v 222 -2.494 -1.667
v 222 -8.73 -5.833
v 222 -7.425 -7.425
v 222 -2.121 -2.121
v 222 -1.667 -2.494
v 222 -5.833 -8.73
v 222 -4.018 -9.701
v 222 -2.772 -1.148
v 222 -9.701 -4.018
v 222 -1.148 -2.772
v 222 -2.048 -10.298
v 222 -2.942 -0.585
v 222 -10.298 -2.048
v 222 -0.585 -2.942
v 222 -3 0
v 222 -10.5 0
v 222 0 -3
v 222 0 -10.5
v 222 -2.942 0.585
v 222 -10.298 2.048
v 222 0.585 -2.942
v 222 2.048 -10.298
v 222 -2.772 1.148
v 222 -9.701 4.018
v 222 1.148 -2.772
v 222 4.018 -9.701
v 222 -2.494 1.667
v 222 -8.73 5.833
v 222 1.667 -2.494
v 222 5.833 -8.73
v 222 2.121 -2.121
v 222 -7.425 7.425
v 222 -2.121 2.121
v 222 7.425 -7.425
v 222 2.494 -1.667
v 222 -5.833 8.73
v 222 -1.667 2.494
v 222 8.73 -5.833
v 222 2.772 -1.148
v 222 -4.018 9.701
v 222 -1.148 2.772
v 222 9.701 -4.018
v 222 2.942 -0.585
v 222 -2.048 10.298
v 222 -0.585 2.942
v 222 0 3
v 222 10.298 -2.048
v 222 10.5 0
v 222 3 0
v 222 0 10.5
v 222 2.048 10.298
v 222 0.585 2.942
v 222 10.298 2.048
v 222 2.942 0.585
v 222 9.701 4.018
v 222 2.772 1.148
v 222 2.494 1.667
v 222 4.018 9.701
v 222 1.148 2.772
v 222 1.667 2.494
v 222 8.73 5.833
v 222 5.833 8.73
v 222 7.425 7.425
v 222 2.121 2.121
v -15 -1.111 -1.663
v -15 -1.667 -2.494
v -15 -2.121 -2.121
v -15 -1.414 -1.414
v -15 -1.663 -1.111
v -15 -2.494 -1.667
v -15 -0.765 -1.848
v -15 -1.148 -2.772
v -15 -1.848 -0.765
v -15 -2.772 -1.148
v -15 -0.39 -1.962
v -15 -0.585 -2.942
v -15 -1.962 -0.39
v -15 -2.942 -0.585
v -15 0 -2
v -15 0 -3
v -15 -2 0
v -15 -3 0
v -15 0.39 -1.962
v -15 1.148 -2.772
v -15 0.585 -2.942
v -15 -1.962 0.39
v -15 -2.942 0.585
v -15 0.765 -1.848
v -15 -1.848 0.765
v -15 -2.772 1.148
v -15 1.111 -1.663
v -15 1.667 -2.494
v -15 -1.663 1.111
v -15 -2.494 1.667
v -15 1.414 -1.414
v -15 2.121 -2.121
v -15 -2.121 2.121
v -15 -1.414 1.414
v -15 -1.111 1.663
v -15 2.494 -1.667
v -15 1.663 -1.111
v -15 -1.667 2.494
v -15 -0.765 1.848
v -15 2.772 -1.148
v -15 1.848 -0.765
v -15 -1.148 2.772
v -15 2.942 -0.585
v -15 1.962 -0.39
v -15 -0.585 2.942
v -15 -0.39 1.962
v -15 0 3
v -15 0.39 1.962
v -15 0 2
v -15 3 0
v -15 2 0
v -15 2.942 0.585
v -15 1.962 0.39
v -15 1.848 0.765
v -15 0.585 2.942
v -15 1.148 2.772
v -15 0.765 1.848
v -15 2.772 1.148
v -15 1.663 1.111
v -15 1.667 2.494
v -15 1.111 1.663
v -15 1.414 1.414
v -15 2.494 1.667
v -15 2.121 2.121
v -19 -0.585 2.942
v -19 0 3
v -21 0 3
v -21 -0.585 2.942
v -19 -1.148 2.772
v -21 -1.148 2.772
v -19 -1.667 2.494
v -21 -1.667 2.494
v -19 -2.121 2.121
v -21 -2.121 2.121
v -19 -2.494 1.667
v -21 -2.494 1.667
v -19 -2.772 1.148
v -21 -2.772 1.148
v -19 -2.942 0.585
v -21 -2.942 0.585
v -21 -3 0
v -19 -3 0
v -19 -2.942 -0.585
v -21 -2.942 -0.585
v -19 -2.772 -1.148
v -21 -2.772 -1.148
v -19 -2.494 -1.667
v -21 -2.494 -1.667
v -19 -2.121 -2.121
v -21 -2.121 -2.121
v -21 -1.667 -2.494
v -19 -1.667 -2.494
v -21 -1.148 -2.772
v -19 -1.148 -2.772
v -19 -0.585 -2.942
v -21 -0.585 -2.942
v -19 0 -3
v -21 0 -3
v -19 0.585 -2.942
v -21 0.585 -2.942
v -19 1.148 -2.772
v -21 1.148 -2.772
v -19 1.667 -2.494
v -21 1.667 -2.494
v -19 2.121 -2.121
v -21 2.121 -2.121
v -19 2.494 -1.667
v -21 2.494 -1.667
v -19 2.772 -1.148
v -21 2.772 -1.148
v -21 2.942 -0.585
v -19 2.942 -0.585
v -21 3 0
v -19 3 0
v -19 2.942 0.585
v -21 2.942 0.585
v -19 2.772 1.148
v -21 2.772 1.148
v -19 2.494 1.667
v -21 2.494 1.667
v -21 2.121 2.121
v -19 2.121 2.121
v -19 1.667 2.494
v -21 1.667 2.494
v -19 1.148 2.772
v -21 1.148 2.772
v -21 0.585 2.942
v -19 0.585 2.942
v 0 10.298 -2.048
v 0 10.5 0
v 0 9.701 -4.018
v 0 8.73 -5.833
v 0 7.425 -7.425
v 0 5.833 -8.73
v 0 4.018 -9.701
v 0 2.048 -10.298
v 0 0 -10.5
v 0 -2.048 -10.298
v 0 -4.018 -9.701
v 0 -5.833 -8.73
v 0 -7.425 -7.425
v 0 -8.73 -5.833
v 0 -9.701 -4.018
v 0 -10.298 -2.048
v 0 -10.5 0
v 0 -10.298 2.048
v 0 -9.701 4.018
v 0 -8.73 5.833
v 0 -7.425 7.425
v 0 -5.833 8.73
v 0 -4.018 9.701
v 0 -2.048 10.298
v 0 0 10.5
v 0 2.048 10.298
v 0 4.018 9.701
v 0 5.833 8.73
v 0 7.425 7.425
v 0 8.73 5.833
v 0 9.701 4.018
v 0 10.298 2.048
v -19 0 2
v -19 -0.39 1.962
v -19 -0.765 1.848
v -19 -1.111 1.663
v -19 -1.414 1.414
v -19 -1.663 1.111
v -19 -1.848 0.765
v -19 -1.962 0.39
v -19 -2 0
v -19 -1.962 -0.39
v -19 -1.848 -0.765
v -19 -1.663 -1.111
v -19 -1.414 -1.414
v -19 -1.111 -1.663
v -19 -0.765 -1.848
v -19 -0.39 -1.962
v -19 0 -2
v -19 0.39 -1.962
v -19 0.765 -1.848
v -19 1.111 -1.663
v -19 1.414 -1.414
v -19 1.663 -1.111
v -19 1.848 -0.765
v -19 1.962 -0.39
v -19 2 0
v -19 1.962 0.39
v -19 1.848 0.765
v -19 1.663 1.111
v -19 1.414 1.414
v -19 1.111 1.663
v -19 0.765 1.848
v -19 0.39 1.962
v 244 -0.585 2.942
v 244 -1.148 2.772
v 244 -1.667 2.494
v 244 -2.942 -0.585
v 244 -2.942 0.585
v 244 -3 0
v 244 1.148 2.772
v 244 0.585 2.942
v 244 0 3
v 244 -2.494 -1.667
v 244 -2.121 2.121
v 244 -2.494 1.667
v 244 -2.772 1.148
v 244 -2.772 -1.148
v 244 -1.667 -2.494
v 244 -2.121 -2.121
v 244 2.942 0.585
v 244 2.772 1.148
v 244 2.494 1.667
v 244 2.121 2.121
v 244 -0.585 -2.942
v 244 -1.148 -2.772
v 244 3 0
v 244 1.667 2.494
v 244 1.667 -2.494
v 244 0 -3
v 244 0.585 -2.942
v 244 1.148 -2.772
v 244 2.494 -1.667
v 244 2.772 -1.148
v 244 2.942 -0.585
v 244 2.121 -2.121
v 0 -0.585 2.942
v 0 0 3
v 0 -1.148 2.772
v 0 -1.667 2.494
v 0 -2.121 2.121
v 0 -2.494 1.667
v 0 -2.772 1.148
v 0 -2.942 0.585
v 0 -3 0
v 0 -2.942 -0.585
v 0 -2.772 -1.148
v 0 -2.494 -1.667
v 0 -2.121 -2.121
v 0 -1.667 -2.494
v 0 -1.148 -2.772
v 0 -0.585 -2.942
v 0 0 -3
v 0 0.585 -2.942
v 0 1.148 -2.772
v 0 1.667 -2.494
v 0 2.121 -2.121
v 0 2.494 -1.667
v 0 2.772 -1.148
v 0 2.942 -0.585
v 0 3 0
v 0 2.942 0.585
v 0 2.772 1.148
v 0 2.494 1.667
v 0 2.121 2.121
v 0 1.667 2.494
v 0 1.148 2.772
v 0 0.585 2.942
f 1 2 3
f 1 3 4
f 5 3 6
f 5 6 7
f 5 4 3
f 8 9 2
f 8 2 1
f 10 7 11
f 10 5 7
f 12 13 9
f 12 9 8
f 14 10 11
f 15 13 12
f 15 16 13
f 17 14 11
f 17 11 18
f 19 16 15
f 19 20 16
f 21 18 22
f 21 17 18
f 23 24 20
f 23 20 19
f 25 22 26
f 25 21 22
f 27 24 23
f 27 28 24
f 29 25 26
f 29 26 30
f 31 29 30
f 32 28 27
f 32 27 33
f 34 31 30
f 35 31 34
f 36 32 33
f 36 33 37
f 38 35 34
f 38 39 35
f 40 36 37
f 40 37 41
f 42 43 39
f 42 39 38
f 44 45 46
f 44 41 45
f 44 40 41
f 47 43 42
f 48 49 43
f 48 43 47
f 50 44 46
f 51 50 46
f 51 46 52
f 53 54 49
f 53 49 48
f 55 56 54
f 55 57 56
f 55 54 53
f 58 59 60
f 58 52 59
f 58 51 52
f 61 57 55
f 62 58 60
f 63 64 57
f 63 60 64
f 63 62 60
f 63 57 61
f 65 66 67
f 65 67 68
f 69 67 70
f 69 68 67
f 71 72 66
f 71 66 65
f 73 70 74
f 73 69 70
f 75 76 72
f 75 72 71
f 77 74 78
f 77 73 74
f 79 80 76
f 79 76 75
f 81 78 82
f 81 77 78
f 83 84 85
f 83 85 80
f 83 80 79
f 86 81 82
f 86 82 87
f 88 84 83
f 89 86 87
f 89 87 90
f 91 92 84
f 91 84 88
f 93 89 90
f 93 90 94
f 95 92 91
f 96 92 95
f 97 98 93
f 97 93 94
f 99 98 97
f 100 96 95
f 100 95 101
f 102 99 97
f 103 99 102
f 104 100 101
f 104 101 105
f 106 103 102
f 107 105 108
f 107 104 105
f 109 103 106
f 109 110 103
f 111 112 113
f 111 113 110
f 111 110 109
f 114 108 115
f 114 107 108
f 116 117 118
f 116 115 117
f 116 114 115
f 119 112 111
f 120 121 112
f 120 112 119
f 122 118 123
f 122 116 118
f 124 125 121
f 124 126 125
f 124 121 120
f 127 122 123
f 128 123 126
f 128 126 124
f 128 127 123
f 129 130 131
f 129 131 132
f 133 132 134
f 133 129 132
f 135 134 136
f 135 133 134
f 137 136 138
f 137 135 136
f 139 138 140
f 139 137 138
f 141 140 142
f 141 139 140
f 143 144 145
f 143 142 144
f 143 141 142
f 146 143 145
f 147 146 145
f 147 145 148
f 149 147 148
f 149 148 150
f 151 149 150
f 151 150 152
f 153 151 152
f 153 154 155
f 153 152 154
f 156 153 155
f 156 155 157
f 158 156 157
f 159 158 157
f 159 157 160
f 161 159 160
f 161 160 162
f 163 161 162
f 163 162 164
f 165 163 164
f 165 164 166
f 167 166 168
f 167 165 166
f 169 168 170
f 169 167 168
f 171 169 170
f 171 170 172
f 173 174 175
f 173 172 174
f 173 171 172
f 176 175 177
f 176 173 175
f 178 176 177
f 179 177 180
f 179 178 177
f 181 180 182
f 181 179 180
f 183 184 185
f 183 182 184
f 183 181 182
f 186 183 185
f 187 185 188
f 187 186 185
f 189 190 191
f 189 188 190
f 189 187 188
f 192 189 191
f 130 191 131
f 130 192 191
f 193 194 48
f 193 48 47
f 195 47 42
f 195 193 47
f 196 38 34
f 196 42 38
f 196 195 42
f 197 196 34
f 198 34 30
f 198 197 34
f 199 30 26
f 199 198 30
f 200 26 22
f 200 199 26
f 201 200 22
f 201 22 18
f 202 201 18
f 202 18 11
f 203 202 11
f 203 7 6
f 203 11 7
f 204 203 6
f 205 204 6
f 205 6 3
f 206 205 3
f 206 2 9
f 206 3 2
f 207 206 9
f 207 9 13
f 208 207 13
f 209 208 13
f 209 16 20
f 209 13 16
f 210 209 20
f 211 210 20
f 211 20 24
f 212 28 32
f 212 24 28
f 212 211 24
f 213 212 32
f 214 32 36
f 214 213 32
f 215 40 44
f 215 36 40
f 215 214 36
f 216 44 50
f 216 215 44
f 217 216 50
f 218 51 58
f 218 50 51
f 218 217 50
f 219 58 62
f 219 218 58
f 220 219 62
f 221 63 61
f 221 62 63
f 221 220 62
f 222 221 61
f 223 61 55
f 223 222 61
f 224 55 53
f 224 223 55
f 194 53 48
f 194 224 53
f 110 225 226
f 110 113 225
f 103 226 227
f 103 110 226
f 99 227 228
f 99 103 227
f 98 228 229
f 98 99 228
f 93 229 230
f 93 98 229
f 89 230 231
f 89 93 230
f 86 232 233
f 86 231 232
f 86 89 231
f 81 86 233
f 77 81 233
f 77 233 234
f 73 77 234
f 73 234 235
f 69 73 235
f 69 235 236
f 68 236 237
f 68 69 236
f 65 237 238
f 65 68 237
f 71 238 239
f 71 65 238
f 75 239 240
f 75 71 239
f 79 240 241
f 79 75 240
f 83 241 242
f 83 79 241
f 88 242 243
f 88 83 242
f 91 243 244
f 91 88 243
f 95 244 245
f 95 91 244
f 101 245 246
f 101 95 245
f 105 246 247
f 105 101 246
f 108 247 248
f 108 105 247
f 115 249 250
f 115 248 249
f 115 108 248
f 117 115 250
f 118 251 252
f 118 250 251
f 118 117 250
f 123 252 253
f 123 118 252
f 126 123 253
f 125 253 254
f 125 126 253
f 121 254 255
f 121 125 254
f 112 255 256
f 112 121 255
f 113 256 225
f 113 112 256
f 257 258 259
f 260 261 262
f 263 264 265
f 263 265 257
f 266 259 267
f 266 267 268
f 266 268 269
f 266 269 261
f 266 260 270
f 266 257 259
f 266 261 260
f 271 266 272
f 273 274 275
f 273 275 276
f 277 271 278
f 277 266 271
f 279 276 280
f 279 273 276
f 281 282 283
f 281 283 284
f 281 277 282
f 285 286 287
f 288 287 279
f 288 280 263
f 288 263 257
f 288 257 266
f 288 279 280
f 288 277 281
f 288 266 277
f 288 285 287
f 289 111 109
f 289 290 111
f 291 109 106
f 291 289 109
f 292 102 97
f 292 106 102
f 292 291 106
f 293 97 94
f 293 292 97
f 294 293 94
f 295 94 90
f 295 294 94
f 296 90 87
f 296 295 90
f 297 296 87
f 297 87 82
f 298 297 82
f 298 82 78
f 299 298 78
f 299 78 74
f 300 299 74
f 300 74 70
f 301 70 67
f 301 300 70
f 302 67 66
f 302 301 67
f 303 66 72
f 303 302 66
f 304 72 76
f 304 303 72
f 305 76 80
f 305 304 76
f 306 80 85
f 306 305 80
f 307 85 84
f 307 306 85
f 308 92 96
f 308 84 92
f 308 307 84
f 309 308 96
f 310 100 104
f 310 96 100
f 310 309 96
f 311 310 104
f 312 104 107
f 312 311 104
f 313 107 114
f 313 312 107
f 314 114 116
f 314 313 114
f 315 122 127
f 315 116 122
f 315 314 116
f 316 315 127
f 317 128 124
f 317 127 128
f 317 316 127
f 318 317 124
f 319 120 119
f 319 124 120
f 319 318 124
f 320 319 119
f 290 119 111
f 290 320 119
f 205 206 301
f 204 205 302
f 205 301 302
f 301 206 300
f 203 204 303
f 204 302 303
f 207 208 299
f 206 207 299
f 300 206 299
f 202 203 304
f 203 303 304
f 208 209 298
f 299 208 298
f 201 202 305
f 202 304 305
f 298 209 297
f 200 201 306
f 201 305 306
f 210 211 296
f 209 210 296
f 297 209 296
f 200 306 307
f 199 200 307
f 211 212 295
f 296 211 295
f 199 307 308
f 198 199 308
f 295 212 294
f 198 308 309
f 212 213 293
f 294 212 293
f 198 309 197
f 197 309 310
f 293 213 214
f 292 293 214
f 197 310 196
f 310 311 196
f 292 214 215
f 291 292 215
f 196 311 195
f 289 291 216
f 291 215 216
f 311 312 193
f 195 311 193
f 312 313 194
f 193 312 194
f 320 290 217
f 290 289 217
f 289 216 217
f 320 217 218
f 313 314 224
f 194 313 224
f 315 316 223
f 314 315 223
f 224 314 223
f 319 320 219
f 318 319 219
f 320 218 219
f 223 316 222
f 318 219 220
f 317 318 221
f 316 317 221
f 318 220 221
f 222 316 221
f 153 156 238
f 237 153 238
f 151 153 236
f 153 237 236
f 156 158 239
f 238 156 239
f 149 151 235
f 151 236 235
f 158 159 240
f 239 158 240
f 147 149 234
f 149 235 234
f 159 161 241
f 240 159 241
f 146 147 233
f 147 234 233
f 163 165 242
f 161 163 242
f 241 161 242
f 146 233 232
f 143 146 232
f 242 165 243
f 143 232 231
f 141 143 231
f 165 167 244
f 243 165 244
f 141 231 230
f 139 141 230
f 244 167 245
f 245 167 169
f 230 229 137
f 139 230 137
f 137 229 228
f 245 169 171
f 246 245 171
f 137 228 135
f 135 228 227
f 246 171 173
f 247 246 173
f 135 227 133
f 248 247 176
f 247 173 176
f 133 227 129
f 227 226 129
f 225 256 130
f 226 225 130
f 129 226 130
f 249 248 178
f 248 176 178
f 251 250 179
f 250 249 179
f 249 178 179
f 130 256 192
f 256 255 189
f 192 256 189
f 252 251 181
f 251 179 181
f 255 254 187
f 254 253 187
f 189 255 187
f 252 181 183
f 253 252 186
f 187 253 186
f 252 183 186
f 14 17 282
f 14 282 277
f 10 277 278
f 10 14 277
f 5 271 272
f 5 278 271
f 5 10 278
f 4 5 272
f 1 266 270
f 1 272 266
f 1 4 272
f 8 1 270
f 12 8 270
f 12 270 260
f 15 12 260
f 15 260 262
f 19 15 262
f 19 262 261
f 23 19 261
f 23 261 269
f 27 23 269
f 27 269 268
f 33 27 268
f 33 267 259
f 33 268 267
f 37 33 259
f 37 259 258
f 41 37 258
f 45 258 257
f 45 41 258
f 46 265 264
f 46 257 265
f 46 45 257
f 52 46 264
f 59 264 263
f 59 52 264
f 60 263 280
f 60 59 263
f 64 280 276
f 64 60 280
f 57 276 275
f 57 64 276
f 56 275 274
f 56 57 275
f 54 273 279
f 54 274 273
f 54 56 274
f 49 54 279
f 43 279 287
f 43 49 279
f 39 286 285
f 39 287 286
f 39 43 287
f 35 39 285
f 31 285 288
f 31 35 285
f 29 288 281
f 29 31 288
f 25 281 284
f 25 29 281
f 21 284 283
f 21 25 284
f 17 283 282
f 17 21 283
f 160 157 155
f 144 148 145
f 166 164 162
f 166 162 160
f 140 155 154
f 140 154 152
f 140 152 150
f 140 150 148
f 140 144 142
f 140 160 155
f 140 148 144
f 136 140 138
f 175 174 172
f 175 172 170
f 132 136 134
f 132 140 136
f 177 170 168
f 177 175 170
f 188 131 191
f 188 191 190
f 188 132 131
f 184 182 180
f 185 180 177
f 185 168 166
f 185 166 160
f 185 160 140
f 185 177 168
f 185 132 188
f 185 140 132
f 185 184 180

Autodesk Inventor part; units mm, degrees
ref_plane "YZ Plane" through (0, 0, 0) normal (1, 0, 0) x (0, 1, 0)
ref_plane "XZ Plane" through (0, 0, 0) normal (0, 1, 0) x (-1, 0, 0)
ref_plane "XY Plane" through (0, 0, 0) normal (0, 0, 1) x (1, 0, 0)
sketch "Sketch1" plane through (0, 0, 0) normal (1, 0, 0) x (0, 1, 0)
  circle A0 centre (0, 0) radius 10.5
  dimension "d0" = 21
extrude "Extrusion1" add sketch "Sketch1" along normal blind 222
sketch "Sketch2" plane through (222, 0, 0) normal (1, 0, 0) x (0, 0, -1)
  circle A0 centre (0, 0) radius 3
  dimension "d3" = 6
extrude "Extrusion2" add sketch "Sketch2" along normal blind 22
sketch "Sketch3" plane through (0, 0, 0) normal (-1, 0, 0) x (0, 0, 1)
  circle A0 centre (0, 0) radius 3
  dimension "d6" = 6
extrude "Extrusion3" add sketch "Sketch3" along normal blind 15
sketch "Sketch4" plane through (-15, 0, 0) normal (-1, 0, 0) x (0, 0, 1)
  circle A0 centre (0, 0) radius 2
  dimension "d9" = 4
extrude "Extrusion4" add sketch "Sketch4" along normal blind 4
sketch "Sketch5" plane through (-19, 0, 0) normal (-1, 0, 0) x (0, 0, 1)
  circle A0 centre (0, 0) radius 3
  dimension "d12" = 6
extrude "Extrusion5" add sketch "Sketch5" along normal blind 2
properties part number "RouleauIdler"
